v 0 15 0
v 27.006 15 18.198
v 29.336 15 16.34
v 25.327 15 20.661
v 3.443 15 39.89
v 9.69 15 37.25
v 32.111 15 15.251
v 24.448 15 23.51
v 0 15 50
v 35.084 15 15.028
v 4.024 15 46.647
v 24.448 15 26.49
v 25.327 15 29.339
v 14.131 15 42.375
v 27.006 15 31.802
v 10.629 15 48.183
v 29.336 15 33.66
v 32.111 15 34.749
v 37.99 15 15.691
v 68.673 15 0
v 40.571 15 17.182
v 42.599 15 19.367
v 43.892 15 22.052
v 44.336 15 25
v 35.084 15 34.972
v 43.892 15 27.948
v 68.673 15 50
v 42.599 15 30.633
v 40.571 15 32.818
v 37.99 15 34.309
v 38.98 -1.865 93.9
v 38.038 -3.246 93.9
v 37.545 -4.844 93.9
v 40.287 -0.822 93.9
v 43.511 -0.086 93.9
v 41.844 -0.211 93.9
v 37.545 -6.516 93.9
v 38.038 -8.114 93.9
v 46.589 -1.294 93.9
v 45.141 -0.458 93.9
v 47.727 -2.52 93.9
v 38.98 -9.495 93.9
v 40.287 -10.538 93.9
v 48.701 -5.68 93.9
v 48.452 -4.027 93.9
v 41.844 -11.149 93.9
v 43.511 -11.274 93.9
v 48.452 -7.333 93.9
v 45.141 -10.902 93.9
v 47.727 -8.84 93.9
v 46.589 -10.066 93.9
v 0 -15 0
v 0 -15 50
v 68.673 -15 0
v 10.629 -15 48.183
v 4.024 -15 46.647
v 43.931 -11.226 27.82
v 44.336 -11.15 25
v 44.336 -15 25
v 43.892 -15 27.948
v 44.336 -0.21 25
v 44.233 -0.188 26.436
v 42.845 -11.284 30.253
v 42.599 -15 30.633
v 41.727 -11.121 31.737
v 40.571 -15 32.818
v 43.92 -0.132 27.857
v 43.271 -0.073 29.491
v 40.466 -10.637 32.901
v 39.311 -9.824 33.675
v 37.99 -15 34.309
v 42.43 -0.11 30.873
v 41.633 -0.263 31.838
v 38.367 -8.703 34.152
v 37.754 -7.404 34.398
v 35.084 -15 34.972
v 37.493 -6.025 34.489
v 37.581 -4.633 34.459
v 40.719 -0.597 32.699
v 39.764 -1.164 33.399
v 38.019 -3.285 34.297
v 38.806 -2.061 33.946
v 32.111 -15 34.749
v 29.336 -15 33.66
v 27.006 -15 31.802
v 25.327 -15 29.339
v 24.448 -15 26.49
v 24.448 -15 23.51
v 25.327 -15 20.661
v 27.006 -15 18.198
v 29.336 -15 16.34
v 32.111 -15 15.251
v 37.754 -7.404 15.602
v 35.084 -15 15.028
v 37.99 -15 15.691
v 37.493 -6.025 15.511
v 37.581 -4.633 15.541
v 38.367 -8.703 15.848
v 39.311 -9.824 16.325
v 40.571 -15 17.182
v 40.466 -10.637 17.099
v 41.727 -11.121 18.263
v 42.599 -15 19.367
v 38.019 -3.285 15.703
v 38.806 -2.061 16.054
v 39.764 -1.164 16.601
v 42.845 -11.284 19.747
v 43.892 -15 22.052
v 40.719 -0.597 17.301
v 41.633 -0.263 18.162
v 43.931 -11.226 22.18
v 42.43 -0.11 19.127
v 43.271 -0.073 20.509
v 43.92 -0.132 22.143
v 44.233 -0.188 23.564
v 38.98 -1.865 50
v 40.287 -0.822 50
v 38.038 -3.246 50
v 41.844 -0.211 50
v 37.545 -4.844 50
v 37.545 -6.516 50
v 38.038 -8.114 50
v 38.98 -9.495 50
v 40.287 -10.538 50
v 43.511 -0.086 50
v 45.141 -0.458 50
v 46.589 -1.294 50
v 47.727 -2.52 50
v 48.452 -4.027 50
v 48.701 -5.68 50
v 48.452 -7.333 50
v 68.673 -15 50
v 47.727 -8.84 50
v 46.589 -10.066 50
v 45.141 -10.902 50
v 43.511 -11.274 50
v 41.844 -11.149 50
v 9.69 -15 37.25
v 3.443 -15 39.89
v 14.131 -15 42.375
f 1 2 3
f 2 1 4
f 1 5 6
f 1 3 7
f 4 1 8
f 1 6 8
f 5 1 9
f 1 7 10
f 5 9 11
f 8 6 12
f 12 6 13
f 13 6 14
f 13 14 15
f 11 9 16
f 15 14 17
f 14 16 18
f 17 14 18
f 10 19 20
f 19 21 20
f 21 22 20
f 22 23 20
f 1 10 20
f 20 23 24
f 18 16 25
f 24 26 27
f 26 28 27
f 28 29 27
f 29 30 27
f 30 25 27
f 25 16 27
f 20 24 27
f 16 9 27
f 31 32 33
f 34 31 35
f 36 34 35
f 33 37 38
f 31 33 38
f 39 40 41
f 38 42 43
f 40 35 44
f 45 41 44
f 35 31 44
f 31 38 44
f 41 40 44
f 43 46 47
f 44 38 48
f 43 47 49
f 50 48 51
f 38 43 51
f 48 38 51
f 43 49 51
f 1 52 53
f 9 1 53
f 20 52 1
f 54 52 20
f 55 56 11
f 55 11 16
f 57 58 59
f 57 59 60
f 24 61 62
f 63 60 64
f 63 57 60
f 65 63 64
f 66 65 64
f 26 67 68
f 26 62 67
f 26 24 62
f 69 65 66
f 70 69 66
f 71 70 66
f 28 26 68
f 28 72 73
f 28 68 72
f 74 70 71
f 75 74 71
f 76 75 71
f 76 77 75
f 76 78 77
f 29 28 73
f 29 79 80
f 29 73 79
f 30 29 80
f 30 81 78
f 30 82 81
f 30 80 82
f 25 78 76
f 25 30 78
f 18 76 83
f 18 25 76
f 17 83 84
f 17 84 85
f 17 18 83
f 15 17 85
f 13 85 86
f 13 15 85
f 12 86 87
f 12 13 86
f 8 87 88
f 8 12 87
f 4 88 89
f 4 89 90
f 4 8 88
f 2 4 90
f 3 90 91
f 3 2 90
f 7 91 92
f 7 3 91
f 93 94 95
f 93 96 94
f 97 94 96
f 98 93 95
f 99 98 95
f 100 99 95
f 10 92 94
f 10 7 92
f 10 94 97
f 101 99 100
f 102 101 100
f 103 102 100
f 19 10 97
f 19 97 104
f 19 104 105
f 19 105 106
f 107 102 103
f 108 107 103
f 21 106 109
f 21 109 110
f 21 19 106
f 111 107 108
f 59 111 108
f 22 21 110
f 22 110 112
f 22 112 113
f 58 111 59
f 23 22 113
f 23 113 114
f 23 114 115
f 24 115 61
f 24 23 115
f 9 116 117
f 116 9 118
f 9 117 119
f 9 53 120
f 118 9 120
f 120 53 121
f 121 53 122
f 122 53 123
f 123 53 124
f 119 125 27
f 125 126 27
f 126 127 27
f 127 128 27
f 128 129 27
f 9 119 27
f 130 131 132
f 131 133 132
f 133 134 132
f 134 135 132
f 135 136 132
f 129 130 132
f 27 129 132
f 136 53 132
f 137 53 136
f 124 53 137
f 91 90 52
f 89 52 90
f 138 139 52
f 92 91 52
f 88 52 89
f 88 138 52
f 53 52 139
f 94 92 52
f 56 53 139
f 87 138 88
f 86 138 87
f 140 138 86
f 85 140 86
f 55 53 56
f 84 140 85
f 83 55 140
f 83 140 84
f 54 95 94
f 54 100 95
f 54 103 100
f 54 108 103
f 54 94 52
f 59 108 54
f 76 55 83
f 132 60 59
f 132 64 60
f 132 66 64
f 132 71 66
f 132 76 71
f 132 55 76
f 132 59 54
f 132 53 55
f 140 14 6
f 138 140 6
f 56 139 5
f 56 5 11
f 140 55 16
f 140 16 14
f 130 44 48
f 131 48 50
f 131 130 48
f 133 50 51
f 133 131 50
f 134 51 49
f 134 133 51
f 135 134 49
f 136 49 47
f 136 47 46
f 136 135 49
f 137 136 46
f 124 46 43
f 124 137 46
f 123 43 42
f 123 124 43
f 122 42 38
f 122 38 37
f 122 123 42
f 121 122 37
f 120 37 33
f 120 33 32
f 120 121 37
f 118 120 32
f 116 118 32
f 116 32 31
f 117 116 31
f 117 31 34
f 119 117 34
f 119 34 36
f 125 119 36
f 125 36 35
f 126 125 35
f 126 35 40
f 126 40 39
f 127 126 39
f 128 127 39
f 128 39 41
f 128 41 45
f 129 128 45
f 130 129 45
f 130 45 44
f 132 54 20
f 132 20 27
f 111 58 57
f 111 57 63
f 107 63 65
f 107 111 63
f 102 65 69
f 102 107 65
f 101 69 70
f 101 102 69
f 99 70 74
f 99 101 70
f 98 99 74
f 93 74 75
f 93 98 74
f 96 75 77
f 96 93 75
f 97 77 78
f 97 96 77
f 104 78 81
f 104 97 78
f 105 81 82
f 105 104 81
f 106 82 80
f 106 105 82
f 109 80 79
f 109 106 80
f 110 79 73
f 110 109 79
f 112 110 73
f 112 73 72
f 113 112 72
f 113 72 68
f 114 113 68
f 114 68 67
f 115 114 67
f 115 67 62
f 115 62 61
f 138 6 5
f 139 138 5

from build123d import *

# Parameters (mm, degrees)
F0_W     = 68.672989
F0_H     = 50
F0_R     = 10
F1_DEPTH = 15
F2_R     = 5.609518
F3_DEPTH = 93.9


with BuildPart() as f1:
    # F0 (on Front) → F1 (new body, symmetric)
    with BuildSketch(Plane.XZ):
        with Locations((34.336495, 25)):
            Rectangle(F0_W, F0_H)
        Polygon((10.629317, 48.182614), (14.130936, 42.374947), (9.689576, 37.250041), (3.443045, 39.890342), (4.023837, 46.647044), align=None, mode=Mode.SUBTRACT)
        with Locations((34.336495, 25)):
            Circle(F0_R, mode=Mode.SUBTRACT)
    extrude(amount=F1_DEPTH, both=True)

    # F2 (on face) → F3 (join)
    with BuildSketch(Plane(origin=(0, 0, 0), x_dir=(1, 0, 0), z_dir=(0, 0, -1))):
        with Locations((43.091845, 5.679999)):
            Circle(F2_R)
    extrude(amount=-F3_DEPTH)


solid = f1.part
